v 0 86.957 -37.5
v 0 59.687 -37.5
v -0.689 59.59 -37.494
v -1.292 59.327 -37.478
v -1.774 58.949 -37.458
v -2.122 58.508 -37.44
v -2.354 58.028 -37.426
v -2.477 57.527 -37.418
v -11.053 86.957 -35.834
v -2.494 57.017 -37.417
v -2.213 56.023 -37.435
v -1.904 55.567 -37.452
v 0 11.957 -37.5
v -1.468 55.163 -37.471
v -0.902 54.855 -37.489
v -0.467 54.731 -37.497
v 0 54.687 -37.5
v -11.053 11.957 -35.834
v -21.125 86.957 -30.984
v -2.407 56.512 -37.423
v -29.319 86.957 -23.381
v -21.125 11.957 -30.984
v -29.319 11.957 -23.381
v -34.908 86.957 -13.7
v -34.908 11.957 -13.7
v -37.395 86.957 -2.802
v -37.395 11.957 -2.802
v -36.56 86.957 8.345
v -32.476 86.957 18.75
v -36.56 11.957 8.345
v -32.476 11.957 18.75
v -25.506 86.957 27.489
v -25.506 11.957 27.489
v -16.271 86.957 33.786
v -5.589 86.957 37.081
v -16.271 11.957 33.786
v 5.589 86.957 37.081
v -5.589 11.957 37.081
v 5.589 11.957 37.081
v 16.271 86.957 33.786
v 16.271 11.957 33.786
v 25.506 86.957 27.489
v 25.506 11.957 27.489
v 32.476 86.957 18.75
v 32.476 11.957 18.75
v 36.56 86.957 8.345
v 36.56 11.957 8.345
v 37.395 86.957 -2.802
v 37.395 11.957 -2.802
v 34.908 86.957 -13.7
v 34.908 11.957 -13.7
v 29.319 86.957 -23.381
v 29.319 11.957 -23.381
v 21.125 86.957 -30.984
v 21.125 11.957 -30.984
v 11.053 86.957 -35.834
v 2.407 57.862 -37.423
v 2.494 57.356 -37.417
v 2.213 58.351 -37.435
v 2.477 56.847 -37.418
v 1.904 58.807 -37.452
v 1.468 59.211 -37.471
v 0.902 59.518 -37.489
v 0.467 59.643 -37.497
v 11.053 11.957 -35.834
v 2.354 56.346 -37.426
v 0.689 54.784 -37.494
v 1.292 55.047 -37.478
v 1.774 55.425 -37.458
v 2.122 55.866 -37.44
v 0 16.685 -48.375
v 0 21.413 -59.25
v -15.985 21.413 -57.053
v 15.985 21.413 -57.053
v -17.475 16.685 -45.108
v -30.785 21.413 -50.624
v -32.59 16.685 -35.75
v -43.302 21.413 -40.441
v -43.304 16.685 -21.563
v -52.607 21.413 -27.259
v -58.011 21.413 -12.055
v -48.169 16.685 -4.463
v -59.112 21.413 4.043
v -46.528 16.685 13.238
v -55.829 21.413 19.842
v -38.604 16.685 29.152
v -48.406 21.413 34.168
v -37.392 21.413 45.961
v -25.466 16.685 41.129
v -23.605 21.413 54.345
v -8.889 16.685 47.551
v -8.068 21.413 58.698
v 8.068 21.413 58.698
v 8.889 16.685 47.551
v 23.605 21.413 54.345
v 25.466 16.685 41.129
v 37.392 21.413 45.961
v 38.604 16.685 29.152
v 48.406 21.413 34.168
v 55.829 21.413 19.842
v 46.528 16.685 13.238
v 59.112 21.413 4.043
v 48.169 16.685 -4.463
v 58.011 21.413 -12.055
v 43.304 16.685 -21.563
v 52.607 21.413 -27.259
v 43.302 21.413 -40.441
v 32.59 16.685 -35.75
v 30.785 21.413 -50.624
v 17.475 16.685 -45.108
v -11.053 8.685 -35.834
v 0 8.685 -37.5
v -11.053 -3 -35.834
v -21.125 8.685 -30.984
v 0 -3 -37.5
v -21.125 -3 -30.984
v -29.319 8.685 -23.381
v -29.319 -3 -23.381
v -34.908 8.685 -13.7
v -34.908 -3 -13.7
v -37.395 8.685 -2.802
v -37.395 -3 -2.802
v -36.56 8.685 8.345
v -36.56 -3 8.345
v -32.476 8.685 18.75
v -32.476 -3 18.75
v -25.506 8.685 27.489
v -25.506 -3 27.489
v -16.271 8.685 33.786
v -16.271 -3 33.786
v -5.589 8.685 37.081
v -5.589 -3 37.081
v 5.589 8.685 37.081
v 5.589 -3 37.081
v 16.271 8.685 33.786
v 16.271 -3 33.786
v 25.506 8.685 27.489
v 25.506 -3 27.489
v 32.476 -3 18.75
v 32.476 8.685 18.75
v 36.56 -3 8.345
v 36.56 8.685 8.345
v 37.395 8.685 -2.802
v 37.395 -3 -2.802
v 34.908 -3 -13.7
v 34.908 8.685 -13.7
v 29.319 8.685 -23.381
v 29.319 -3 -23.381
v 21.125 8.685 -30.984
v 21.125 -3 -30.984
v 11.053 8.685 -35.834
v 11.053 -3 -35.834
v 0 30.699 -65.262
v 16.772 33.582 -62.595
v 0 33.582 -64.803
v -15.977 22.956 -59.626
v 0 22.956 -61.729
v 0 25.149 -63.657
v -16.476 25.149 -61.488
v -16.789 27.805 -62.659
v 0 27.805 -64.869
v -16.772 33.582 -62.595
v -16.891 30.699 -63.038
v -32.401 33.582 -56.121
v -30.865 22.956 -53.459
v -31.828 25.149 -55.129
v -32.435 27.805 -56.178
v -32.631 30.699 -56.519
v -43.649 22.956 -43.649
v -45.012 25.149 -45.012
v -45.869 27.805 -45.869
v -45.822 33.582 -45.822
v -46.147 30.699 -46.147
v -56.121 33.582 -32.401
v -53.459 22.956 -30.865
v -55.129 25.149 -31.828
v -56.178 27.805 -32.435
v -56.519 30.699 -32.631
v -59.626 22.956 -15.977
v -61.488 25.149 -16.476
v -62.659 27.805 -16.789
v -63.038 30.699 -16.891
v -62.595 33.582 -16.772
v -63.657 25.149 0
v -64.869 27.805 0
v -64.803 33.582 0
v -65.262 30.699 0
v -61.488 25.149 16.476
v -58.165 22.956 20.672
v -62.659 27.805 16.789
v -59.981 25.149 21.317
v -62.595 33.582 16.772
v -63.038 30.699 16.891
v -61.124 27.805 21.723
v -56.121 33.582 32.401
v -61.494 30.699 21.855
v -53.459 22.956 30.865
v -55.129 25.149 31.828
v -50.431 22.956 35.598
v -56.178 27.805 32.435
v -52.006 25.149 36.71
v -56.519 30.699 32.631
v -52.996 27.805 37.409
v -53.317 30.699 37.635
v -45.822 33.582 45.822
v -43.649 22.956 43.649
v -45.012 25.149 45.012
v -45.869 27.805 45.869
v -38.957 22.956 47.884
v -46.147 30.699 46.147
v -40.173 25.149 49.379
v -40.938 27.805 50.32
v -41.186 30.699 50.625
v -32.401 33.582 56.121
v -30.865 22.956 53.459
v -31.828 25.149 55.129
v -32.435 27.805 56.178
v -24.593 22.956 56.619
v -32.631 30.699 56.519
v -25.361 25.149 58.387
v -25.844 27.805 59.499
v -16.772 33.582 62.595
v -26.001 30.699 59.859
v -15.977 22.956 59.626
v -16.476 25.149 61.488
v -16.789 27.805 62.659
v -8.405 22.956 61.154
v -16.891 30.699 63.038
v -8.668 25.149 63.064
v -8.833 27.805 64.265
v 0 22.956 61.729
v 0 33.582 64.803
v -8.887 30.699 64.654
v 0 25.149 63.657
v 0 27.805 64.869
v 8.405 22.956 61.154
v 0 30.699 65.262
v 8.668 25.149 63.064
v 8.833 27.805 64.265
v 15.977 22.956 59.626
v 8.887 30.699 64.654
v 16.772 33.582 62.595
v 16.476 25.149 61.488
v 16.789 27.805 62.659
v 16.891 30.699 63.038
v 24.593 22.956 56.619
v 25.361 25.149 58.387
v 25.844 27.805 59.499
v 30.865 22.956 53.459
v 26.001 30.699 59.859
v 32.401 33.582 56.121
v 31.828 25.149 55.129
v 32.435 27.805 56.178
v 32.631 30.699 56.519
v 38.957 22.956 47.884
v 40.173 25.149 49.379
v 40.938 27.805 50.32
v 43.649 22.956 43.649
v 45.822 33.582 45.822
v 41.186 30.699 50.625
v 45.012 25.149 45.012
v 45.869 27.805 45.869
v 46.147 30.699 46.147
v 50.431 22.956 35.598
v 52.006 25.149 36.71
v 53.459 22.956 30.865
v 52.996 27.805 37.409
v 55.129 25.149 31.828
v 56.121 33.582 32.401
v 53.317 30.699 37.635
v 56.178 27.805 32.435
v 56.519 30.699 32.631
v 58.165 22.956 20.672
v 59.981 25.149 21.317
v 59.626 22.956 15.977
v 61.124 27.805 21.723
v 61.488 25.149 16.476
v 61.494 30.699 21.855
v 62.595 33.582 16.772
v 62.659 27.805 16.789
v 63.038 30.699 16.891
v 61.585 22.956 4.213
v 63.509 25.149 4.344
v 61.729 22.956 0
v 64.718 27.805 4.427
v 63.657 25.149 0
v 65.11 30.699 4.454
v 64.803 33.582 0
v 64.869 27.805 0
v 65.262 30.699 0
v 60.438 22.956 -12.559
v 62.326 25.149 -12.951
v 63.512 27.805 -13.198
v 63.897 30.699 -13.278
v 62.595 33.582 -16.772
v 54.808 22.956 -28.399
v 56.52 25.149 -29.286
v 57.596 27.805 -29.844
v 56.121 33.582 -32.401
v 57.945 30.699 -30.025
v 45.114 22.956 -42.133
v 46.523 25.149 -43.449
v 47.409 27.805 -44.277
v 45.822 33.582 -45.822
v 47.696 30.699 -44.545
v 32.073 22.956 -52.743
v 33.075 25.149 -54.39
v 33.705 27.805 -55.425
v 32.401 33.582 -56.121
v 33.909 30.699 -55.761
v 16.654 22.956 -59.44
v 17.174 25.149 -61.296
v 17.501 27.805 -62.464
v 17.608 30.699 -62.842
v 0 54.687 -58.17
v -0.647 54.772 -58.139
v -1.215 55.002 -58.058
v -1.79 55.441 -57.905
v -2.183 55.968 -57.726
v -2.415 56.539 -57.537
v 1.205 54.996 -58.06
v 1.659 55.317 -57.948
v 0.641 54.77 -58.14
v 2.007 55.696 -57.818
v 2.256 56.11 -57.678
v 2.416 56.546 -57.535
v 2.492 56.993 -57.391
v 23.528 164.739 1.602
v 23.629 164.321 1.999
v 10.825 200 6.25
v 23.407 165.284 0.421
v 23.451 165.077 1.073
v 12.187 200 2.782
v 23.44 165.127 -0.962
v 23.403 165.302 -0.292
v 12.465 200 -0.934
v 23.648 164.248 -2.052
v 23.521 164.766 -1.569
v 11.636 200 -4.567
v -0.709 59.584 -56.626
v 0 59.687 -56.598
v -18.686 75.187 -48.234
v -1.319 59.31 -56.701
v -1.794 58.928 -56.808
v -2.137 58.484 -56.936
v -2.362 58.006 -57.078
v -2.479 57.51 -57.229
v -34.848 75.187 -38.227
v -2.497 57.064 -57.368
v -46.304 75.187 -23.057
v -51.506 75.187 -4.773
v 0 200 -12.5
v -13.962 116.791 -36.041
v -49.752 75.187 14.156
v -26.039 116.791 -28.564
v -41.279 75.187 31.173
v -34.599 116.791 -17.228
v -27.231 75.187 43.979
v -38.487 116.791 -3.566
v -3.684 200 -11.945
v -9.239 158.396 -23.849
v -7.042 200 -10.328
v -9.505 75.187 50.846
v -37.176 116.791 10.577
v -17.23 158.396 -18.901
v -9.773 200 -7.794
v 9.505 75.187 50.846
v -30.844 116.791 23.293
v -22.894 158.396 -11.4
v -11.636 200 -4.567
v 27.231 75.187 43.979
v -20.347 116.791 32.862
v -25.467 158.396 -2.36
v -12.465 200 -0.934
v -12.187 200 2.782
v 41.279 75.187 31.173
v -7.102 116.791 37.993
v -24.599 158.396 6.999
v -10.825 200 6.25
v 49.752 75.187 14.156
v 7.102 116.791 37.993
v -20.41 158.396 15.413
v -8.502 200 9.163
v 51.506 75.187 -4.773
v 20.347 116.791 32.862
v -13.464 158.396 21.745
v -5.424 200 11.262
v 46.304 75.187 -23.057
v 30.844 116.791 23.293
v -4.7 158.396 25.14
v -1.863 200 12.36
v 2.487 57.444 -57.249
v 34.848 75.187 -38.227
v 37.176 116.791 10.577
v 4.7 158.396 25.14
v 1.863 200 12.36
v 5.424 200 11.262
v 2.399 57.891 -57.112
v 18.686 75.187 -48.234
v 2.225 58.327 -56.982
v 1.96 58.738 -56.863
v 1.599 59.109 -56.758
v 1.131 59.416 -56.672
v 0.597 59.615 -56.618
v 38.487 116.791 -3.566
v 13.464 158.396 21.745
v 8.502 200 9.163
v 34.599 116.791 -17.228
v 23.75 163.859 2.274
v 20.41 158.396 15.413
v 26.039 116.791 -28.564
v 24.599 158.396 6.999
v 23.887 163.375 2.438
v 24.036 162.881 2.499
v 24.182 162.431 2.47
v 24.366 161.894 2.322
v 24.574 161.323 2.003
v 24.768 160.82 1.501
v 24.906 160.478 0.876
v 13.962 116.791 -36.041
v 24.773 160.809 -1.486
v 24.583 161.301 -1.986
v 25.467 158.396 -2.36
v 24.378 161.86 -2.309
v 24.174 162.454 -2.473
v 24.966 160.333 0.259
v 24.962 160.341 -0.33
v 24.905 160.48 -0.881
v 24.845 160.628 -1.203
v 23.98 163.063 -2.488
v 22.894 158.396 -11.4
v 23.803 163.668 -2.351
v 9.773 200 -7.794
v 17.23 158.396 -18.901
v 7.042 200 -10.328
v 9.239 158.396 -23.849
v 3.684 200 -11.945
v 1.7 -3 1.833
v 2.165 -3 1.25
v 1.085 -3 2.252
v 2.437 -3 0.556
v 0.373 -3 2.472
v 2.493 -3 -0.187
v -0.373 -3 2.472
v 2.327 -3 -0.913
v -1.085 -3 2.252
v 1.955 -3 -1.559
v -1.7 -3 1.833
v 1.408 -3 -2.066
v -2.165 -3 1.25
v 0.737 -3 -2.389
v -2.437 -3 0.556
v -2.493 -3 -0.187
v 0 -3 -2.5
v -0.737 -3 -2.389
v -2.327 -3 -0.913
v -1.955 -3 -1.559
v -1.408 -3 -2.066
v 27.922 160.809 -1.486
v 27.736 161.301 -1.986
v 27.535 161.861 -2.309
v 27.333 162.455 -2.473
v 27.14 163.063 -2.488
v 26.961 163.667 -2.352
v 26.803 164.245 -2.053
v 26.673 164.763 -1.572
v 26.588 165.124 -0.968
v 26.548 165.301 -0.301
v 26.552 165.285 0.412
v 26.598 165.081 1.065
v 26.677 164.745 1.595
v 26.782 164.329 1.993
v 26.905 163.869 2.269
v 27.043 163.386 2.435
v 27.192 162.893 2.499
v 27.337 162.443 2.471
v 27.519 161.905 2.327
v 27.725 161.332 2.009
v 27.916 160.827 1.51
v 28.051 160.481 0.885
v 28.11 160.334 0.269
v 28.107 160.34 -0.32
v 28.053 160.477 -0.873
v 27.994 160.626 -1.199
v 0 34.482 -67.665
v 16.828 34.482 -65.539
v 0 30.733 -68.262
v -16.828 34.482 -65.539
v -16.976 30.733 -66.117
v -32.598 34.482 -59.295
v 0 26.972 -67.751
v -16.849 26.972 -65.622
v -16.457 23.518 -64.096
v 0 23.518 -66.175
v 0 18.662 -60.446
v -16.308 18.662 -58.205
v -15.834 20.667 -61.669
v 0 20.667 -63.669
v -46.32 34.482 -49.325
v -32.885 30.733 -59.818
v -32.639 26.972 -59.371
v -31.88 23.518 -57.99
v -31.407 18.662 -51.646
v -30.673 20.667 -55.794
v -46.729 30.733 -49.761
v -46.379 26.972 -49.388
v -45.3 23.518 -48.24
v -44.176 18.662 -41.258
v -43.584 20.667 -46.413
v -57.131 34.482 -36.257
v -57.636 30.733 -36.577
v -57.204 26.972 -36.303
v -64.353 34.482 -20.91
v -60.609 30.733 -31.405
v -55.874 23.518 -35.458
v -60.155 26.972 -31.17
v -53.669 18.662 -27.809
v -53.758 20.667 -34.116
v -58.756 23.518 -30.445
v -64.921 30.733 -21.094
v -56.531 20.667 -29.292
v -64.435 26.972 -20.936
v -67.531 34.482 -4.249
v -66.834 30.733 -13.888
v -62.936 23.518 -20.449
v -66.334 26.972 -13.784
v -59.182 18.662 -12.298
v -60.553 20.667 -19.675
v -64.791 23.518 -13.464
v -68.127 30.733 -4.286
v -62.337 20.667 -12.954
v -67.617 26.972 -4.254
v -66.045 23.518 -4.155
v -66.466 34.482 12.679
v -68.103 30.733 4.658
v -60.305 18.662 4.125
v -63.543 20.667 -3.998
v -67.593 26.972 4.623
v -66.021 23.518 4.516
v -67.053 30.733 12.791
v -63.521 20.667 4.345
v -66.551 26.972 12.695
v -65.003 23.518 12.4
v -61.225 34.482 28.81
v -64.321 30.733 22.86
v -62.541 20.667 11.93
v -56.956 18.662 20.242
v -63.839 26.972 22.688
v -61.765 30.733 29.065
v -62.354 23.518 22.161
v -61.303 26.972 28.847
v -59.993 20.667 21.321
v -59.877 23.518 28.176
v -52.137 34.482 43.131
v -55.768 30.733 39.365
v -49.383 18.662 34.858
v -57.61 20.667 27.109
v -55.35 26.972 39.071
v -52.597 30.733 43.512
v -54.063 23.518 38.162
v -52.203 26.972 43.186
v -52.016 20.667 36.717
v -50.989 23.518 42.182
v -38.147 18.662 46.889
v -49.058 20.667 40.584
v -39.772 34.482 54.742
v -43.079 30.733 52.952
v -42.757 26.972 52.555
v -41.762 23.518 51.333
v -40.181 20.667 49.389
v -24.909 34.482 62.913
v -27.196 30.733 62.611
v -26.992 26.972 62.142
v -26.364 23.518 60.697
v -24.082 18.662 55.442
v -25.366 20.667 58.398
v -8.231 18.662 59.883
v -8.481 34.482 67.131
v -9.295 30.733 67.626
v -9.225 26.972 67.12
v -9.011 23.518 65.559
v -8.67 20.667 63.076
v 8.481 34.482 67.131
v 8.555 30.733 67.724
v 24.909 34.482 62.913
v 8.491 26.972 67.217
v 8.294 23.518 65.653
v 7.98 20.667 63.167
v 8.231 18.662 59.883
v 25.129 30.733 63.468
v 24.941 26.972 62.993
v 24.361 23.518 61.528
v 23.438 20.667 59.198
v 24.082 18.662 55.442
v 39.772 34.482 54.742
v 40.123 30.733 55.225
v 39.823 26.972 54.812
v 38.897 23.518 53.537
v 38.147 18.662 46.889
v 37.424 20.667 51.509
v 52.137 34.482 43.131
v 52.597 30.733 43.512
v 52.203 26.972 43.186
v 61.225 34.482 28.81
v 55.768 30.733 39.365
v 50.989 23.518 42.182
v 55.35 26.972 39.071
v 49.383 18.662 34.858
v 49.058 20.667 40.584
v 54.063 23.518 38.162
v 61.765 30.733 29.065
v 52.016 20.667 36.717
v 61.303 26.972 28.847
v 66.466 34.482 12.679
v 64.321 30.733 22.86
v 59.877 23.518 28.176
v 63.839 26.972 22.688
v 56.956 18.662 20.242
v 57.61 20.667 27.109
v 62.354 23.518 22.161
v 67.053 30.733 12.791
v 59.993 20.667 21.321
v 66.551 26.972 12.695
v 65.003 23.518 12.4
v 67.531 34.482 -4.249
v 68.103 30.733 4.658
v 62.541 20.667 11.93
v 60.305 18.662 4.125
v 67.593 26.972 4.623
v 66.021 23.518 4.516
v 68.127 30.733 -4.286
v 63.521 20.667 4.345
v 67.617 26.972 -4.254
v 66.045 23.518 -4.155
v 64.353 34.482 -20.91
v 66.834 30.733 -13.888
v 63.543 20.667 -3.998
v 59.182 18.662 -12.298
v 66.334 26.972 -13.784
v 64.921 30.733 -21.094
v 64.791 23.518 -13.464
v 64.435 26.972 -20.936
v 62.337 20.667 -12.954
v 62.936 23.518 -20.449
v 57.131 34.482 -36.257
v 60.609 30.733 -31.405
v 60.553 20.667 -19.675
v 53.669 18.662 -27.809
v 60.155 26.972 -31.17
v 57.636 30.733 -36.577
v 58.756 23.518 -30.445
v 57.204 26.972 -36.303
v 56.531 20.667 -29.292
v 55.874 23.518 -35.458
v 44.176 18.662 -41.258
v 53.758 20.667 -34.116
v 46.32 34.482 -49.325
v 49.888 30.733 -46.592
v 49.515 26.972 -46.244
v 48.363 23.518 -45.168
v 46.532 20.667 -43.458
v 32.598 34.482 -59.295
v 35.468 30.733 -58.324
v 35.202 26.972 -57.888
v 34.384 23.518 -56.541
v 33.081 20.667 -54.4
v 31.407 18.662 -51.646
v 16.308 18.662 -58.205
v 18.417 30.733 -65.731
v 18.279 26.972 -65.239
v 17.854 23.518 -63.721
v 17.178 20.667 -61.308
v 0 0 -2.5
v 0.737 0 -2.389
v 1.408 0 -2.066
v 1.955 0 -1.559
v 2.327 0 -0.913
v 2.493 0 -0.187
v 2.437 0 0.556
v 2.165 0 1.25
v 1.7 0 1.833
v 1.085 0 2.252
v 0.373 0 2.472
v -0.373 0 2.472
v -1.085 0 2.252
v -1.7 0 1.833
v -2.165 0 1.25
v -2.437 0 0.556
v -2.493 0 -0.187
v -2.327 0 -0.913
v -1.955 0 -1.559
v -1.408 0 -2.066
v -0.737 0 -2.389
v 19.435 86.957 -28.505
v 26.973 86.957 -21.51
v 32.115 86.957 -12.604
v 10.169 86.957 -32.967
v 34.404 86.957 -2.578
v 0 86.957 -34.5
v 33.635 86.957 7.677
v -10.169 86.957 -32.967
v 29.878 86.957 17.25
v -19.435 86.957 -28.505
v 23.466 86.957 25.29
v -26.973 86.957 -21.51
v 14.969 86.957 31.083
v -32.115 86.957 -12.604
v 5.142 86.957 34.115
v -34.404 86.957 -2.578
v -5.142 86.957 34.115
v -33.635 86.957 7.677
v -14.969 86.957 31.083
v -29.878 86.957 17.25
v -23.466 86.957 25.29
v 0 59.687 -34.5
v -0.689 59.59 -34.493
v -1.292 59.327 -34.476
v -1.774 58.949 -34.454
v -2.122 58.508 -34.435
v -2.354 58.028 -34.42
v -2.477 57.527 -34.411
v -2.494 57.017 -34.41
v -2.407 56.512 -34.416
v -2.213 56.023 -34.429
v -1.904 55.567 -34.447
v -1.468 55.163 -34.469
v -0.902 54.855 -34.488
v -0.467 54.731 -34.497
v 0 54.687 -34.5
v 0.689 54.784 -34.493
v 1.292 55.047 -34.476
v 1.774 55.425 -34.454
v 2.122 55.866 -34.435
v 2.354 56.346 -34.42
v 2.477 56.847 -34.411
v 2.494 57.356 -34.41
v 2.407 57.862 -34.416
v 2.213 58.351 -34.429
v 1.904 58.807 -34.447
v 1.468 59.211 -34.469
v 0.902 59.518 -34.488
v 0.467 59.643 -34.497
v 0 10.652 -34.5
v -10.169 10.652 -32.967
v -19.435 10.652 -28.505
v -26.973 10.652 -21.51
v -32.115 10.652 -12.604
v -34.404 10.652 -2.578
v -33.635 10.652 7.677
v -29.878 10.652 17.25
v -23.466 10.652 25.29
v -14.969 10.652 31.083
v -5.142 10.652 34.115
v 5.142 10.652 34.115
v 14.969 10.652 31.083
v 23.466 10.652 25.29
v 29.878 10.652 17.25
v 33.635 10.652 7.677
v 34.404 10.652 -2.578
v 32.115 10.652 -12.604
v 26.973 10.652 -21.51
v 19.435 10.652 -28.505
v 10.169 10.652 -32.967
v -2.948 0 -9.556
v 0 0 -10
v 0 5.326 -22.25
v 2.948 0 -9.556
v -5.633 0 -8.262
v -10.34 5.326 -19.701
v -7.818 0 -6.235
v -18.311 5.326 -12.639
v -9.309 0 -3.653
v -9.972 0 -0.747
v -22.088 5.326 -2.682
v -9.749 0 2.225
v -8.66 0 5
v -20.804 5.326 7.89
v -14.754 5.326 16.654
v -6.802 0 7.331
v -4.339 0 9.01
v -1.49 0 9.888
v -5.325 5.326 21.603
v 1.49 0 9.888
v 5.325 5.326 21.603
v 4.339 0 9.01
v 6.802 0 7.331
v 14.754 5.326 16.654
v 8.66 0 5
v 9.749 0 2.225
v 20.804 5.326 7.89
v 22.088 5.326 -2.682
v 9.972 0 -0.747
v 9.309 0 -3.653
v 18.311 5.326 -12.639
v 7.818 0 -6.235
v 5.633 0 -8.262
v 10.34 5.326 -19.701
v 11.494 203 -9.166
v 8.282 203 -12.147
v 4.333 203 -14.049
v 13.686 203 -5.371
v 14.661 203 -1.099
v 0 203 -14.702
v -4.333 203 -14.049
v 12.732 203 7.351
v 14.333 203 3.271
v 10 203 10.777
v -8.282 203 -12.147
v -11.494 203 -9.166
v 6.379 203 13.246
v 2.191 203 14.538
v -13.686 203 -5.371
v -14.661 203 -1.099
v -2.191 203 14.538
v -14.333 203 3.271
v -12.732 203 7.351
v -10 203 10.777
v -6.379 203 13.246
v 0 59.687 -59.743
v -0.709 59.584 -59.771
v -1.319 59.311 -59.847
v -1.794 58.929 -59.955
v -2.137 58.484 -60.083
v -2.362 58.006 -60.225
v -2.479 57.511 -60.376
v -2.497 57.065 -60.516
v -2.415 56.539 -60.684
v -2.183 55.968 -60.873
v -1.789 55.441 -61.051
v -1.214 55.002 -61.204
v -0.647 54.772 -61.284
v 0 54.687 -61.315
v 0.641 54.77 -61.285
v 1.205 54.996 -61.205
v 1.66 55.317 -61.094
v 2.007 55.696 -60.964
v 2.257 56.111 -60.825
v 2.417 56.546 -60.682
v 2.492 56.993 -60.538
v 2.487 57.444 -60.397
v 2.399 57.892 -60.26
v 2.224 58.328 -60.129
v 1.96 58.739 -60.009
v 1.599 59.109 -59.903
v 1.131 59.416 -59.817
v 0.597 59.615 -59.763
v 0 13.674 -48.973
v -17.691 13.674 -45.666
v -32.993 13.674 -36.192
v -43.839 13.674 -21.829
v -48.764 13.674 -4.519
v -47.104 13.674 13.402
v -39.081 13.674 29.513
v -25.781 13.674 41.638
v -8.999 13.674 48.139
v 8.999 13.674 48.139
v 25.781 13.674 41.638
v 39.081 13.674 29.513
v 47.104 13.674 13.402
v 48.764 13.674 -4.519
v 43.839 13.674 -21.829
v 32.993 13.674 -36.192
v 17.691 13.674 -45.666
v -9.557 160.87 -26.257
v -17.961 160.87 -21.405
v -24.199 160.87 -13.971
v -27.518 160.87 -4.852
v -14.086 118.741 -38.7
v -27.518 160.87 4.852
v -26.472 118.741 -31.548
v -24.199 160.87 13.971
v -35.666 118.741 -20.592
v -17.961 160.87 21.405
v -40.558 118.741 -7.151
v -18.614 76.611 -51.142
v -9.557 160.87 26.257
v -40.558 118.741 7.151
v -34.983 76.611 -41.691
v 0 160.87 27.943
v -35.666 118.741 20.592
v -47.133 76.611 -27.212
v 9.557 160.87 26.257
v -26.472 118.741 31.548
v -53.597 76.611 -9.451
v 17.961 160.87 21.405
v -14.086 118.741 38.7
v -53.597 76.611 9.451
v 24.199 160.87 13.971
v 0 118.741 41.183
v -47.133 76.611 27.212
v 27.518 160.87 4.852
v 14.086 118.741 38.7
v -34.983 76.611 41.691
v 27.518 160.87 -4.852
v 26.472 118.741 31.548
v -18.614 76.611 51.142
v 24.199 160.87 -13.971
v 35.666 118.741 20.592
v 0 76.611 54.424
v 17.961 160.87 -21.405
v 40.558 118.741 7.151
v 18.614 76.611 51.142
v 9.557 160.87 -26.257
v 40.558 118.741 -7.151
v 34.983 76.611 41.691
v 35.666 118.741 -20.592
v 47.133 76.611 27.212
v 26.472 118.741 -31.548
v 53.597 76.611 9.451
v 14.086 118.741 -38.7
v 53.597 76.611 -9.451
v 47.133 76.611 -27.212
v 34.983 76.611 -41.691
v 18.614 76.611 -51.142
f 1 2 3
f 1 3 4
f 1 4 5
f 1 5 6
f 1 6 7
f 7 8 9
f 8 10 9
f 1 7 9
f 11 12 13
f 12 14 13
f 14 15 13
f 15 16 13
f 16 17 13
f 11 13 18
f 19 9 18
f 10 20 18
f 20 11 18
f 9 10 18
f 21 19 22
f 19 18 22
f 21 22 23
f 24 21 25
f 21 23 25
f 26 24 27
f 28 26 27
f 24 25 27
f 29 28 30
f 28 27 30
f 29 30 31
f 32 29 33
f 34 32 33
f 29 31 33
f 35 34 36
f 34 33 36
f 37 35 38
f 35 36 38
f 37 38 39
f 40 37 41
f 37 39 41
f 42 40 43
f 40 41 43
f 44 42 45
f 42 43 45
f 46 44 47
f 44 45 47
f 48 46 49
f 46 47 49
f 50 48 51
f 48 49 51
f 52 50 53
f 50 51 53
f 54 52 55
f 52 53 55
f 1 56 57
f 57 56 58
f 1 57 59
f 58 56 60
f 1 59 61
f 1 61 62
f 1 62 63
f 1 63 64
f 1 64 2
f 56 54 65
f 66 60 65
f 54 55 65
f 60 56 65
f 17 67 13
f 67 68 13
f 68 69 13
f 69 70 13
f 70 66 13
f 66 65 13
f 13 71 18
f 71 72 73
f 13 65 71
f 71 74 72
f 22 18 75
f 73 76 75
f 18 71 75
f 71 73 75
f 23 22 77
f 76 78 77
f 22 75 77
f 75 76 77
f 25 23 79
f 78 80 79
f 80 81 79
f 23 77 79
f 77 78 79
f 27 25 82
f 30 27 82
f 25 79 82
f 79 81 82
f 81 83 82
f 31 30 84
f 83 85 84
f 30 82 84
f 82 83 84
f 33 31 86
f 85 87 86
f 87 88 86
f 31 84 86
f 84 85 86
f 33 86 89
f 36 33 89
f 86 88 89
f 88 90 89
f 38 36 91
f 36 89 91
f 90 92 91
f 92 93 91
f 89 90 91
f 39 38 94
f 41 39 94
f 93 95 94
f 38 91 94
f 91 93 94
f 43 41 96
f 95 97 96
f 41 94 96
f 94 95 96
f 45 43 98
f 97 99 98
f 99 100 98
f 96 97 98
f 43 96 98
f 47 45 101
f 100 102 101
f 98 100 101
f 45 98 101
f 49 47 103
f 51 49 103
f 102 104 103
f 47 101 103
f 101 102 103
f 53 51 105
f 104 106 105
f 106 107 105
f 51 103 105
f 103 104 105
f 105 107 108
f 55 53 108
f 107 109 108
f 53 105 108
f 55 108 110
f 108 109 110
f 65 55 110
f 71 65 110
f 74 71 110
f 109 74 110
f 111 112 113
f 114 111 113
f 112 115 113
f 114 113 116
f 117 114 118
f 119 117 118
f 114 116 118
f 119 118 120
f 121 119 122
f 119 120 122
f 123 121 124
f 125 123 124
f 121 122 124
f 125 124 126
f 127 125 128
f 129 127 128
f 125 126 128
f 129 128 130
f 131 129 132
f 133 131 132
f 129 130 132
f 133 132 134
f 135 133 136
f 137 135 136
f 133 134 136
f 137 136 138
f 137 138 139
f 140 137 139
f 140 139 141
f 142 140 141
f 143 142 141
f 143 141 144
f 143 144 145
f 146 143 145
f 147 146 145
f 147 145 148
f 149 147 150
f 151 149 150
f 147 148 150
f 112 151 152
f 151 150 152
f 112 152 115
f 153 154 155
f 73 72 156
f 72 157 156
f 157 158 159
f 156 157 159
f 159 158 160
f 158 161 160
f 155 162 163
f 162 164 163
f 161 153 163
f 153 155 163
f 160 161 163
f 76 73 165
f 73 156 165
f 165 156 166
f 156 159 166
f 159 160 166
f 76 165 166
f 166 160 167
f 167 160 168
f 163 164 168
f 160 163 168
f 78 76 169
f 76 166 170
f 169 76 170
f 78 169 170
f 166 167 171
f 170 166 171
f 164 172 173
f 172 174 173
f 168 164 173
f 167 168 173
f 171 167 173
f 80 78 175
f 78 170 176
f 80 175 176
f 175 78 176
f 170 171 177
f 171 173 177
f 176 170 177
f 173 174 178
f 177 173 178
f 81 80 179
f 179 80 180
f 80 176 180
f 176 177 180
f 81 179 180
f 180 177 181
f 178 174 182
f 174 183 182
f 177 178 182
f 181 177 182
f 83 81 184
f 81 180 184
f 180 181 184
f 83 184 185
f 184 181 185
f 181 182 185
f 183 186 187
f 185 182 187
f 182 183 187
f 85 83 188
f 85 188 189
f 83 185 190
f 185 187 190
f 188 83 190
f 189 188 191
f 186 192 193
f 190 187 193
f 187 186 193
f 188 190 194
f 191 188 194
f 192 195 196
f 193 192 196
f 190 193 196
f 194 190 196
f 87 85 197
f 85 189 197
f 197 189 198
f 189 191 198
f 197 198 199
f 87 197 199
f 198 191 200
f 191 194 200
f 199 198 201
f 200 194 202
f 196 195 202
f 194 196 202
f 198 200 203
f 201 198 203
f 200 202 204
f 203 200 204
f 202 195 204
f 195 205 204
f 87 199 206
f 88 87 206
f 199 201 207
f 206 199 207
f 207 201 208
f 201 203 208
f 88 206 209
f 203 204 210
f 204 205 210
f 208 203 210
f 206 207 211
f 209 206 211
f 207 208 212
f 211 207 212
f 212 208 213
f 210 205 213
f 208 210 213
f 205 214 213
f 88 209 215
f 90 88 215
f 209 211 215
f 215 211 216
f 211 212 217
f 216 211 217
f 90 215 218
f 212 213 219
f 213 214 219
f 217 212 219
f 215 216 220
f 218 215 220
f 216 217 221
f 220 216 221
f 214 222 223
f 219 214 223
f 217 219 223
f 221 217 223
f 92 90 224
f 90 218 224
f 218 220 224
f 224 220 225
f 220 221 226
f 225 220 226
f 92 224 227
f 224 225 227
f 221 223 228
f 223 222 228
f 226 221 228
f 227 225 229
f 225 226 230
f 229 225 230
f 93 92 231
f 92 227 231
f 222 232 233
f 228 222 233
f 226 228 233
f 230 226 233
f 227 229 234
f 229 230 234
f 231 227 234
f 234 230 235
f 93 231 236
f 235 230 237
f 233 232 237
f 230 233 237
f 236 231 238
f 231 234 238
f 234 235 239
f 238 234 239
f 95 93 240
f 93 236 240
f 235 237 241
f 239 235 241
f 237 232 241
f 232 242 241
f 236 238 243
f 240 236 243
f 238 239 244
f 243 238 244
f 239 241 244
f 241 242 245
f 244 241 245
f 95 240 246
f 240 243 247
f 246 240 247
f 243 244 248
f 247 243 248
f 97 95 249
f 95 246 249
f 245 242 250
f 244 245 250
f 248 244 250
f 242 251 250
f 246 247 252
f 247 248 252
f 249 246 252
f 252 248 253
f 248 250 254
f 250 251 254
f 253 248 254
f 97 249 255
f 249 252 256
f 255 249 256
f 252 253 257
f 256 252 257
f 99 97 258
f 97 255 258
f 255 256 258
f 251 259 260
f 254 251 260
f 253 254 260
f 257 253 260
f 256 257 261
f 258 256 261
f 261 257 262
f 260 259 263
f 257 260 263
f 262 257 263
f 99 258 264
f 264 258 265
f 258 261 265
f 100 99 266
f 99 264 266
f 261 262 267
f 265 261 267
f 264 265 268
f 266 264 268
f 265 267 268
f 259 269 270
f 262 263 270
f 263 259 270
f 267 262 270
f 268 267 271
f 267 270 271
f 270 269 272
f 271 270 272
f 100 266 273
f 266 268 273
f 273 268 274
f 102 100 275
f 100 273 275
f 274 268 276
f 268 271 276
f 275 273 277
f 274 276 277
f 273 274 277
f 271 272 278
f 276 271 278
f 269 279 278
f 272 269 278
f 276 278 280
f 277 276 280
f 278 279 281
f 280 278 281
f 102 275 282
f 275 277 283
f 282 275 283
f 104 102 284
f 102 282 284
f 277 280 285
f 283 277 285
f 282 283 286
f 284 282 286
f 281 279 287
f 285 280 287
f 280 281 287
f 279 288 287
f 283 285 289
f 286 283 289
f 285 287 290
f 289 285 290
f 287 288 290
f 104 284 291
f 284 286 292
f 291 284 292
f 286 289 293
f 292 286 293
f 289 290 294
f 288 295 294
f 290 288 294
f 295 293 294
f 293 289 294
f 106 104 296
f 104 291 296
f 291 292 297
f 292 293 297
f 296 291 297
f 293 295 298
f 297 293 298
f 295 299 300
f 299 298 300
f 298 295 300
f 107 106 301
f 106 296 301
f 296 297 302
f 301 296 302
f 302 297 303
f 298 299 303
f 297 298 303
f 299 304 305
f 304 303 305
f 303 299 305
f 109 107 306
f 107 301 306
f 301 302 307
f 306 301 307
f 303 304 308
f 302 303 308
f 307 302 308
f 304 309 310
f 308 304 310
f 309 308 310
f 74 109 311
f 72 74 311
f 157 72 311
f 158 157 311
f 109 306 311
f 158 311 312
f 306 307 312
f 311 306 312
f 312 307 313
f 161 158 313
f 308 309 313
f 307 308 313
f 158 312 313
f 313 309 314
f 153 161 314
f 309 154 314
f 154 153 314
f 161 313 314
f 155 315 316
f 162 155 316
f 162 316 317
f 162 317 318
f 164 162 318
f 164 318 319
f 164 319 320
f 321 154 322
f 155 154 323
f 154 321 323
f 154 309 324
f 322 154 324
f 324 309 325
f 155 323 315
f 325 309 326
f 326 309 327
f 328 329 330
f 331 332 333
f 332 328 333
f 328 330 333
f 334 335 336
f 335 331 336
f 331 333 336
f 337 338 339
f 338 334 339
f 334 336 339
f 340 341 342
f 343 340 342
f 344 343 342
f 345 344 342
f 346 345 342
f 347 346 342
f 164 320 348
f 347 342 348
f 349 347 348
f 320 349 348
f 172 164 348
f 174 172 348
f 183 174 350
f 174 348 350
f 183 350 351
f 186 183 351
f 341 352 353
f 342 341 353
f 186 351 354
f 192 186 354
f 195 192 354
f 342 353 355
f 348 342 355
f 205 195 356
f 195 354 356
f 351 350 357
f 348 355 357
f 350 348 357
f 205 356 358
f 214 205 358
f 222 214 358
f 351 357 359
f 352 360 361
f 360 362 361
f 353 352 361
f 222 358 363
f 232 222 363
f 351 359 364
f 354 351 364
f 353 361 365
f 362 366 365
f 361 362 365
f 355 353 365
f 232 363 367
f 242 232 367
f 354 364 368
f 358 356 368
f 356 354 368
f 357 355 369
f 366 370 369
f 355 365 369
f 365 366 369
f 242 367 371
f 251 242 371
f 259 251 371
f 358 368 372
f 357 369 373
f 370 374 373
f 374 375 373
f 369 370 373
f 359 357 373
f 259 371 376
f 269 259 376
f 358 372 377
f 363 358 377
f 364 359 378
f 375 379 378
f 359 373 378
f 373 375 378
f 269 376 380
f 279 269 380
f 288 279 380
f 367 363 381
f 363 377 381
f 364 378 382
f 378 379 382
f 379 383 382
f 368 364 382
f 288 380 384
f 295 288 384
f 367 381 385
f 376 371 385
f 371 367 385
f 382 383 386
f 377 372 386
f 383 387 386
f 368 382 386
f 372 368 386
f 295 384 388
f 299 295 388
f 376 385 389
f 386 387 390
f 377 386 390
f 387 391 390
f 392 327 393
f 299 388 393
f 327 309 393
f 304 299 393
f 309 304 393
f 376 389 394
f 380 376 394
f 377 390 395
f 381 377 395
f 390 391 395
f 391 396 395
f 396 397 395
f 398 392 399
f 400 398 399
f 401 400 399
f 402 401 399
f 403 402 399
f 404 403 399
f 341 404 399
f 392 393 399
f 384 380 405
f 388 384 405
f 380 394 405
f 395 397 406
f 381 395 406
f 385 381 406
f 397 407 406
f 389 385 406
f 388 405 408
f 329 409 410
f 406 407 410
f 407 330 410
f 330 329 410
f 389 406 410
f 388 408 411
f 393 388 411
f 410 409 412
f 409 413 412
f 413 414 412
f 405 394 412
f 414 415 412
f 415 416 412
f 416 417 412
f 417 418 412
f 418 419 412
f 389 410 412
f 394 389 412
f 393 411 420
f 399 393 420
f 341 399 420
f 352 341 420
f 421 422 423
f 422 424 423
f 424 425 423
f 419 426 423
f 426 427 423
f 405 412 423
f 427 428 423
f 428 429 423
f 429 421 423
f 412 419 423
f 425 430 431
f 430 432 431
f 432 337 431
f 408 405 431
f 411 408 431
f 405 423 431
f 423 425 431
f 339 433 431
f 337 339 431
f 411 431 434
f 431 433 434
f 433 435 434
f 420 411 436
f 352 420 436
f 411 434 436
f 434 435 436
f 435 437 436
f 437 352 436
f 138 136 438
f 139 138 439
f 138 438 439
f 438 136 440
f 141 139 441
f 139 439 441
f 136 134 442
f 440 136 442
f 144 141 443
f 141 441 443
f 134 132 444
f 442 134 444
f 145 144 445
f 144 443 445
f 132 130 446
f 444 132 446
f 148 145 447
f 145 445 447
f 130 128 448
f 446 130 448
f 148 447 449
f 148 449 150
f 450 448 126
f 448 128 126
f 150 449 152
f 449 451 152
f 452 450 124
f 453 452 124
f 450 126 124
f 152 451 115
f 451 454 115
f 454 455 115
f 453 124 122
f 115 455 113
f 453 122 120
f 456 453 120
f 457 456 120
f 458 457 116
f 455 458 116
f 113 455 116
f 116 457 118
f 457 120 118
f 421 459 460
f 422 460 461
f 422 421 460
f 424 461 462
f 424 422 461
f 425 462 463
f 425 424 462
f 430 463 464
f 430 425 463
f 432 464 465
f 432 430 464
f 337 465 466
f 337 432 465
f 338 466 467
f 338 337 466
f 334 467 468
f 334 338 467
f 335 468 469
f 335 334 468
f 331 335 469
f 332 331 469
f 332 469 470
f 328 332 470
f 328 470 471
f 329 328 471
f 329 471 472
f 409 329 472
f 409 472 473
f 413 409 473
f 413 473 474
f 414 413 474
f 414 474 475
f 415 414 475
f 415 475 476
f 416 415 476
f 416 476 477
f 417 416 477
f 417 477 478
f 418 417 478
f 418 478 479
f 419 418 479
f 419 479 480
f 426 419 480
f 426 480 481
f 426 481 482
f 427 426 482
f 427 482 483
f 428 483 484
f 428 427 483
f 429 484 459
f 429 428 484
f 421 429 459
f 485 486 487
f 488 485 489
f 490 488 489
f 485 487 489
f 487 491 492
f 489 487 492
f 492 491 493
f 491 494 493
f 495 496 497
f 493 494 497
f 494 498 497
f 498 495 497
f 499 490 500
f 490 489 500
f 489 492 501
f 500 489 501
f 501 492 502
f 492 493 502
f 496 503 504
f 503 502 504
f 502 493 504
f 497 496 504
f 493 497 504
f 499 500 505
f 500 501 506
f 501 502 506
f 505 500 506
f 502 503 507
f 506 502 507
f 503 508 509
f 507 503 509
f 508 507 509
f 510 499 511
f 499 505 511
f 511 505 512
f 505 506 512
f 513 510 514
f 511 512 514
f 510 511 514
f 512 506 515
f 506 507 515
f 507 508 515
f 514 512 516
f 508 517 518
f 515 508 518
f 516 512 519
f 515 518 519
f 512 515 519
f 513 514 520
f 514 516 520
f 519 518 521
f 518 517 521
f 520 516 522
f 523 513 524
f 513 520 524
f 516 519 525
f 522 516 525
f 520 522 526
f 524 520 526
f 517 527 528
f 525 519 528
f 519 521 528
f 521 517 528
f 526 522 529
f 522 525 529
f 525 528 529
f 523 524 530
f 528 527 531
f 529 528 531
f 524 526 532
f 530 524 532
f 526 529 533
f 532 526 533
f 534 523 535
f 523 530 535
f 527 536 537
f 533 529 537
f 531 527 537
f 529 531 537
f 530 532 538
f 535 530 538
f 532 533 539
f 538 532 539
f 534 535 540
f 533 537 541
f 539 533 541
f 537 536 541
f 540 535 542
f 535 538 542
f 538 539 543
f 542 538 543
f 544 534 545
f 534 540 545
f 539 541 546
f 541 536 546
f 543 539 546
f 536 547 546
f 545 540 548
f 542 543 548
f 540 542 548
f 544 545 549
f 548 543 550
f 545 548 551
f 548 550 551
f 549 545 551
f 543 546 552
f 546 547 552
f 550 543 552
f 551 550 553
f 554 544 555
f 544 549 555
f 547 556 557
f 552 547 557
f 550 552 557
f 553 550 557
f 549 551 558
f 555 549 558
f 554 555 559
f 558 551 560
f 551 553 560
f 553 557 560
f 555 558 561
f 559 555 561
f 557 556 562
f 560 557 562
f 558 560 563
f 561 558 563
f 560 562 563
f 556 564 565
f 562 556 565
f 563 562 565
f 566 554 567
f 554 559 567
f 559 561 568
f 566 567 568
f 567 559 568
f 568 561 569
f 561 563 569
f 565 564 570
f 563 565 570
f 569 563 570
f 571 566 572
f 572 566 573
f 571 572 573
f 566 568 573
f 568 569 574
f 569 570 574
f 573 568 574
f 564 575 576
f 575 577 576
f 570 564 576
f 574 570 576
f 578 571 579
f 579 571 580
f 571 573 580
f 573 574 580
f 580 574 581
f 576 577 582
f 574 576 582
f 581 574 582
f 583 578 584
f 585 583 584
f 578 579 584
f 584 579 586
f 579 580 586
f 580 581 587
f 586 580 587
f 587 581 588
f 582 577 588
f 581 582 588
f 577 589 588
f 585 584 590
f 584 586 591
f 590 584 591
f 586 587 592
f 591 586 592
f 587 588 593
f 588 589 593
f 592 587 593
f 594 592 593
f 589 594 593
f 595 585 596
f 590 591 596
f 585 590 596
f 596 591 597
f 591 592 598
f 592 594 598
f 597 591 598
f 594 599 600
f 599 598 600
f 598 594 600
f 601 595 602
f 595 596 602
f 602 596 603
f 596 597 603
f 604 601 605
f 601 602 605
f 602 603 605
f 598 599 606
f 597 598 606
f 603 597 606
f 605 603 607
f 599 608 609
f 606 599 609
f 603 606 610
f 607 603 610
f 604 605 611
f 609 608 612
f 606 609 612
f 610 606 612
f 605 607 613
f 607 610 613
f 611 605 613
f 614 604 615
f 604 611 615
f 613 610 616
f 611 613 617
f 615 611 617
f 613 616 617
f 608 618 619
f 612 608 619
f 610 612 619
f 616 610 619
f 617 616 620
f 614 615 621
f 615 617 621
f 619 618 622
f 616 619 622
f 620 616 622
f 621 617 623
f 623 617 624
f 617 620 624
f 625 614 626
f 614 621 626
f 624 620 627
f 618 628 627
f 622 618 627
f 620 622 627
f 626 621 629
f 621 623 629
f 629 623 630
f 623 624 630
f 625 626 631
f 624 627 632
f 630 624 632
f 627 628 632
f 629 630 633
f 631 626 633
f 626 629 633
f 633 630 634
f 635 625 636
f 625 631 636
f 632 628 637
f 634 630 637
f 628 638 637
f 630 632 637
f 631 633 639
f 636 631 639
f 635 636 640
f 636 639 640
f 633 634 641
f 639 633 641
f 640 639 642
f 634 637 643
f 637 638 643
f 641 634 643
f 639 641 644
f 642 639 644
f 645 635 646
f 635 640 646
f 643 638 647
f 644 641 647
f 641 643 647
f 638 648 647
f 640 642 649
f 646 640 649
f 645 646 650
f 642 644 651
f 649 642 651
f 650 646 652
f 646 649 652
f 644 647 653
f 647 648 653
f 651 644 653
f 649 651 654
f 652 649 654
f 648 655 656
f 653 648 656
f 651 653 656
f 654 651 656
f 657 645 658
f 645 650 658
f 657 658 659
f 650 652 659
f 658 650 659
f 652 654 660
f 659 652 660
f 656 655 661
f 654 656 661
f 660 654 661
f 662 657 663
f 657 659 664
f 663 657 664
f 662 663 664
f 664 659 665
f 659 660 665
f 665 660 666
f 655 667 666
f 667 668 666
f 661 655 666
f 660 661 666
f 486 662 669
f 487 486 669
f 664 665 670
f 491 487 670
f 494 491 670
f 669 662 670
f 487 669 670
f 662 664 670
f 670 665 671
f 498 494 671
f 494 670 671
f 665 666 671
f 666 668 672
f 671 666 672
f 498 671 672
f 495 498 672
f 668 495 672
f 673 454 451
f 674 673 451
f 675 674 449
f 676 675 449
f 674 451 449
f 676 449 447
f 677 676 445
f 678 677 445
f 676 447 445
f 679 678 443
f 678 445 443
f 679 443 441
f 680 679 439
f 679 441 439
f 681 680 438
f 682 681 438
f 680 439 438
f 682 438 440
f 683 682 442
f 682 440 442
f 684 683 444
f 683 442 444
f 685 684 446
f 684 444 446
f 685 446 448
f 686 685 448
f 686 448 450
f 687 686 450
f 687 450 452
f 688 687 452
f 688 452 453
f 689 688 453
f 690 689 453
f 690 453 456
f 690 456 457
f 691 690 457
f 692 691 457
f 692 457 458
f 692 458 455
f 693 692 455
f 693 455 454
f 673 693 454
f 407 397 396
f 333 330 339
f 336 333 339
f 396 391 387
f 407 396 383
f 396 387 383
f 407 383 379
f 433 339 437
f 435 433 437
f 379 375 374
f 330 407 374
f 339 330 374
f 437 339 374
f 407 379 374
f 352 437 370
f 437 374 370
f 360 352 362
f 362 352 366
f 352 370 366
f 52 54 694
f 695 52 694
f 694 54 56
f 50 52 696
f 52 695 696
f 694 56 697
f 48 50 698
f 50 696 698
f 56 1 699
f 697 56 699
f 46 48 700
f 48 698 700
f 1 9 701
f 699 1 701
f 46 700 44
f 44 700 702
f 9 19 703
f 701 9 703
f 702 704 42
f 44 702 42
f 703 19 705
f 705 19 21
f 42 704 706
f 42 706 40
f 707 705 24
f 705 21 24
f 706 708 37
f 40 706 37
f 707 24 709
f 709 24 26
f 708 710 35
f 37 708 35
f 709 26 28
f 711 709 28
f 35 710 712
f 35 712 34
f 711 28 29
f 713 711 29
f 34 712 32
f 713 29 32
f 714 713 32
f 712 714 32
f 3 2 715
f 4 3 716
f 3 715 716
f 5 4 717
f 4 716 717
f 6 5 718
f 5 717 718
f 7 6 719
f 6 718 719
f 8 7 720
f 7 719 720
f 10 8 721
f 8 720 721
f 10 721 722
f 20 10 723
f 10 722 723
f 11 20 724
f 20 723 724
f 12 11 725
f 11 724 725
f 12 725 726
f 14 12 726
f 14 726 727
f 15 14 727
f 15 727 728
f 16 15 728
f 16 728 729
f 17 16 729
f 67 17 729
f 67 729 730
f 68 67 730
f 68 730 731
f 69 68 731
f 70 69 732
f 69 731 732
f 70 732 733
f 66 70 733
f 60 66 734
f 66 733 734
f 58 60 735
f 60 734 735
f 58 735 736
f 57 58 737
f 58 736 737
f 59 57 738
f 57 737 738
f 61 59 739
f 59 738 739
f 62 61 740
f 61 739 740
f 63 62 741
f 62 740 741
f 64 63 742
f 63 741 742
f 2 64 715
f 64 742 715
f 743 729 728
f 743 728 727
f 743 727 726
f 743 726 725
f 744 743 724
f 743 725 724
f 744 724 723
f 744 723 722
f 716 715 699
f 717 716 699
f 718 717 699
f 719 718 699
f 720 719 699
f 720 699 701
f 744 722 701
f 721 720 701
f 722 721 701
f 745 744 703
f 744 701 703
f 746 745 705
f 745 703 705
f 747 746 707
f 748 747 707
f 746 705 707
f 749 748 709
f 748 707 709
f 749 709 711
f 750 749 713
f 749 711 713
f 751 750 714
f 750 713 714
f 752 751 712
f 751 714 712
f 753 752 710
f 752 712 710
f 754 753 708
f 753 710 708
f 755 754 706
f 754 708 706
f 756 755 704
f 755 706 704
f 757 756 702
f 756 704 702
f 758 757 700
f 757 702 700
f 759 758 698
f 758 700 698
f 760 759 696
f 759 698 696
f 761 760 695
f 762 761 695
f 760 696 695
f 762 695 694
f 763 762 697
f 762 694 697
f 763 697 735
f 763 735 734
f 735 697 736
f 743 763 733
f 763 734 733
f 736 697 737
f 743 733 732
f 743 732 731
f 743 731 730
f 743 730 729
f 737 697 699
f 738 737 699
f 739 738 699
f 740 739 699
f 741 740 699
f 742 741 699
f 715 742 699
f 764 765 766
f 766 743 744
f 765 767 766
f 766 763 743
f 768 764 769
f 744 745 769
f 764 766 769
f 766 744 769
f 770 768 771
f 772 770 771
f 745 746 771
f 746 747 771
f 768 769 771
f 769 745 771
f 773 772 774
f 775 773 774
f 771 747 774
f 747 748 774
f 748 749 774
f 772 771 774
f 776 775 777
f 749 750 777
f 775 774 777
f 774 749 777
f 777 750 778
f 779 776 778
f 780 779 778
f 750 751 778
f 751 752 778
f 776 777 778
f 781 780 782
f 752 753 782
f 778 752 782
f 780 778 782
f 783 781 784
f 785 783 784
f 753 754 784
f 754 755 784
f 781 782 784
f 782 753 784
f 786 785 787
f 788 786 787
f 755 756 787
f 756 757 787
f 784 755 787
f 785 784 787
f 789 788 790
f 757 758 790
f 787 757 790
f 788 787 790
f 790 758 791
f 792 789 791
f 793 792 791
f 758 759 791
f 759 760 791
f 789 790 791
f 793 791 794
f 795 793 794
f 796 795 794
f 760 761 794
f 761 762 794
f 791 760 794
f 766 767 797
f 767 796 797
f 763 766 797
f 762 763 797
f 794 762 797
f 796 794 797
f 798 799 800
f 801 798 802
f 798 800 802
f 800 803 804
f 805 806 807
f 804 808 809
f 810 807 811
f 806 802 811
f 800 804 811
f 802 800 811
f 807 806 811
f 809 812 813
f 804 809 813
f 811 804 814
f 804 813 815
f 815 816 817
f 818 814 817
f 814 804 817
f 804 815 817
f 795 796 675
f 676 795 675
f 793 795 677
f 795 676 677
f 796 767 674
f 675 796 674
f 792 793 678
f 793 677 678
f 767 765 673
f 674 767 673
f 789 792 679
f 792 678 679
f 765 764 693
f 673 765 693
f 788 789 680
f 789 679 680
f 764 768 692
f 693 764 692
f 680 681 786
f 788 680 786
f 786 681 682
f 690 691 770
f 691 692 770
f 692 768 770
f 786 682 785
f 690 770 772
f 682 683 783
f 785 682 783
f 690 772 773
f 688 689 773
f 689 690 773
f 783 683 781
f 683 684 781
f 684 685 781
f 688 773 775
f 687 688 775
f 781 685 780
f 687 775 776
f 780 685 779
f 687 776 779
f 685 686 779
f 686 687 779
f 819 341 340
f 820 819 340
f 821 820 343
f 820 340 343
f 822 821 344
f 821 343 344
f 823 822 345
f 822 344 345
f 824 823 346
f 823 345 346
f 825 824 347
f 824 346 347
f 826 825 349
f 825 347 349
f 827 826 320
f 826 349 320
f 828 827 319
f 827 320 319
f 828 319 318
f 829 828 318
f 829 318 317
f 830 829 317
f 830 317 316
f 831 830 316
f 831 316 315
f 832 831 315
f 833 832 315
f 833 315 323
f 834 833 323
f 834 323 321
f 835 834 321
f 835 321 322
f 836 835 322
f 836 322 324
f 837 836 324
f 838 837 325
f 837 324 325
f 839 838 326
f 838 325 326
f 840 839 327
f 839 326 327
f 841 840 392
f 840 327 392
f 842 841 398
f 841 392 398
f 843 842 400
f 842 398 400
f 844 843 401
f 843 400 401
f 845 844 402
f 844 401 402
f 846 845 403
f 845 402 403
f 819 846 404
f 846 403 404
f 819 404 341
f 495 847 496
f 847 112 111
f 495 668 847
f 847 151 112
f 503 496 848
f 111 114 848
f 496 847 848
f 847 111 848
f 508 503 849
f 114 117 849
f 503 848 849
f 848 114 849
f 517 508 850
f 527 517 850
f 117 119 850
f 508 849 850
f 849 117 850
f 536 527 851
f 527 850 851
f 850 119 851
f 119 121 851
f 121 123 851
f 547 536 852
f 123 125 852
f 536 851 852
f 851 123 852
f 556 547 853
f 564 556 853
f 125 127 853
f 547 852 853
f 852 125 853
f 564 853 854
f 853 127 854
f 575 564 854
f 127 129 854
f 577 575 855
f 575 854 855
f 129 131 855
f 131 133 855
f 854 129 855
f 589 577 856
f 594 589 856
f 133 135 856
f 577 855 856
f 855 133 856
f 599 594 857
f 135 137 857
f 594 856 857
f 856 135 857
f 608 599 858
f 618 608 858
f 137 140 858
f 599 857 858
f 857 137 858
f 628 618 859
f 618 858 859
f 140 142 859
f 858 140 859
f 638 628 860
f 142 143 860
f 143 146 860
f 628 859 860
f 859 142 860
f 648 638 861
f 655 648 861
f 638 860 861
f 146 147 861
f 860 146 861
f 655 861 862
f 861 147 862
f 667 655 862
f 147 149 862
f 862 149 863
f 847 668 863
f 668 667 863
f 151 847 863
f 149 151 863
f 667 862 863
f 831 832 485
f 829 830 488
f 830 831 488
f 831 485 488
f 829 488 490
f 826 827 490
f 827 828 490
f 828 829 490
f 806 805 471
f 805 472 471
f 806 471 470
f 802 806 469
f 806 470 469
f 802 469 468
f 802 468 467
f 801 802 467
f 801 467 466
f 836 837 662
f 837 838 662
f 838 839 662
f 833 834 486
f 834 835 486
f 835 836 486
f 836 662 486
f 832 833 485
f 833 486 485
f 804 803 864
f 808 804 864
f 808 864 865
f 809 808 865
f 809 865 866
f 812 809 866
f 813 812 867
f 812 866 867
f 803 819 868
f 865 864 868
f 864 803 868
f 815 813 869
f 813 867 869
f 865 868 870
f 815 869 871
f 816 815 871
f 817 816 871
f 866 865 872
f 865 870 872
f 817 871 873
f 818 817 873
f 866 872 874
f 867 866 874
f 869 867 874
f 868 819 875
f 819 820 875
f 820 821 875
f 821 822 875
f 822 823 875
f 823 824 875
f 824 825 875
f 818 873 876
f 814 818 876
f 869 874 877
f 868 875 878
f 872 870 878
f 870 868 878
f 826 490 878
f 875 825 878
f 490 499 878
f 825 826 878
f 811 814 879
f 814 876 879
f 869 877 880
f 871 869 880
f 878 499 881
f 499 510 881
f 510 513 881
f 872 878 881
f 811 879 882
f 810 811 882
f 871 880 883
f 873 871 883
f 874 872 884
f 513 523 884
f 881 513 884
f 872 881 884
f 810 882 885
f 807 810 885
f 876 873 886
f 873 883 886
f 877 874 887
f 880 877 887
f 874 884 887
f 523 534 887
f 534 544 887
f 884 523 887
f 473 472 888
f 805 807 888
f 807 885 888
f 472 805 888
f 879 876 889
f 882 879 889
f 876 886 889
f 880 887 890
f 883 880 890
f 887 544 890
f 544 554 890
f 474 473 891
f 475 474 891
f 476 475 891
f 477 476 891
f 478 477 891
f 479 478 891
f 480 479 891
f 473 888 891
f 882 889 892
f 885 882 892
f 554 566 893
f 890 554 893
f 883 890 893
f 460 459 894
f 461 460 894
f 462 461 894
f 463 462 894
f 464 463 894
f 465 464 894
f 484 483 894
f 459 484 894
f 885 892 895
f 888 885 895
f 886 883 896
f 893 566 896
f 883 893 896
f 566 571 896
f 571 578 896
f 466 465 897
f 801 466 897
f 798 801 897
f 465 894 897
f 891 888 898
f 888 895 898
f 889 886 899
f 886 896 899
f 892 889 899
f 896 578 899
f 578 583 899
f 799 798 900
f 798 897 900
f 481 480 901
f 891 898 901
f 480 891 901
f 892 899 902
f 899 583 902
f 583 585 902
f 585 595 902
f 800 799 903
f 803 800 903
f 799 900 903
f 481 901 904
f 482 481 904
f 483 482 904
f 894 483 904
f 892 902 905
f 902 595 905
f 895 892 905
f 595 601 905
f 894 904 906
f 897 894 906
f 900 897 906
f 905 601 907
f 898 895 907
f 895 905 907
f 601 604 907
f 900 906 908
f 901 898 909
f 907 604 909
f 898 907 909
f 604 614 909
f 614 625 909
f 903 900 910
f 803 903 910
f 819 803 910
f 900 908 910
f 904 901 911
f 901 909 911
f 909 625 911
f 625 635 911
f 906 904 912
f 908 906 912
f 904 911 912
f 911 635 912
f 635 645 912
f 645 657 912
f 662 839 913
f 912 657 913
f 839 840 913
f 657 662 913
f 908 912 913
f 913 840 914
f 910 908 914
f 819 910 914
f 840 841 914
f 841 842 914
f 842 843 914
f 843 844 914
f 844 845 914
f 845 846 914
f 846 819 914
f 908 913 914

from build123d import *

# Parameters (mm, degrees)
CORTE_EXTRUS_O1_REACH = 208
ESBO_O2_R             = 2.5
ESBO_O4_R             = 2.5
CORTE_EXTRUS_O2_DEPTH = 50
ESBO_O5_R             = 2.5
CORTE_EXTRUS_O3_DEPTH = 110


with BuildPart() as part:
    # Esboço1 → Revolução1 (revolve)
    with BuildSketch(Plane.XY, mode=Mode.PRIVATE) as revolu_o1_sk:
        with BuildLine():
            Line((0, 0), (10, 0))
            Line((10, 0), (34.5, 10.652173913))
            Line((34.5, 10.652173913), (34.5, 86.956521739))
            Line((34.5, 86.956521739), (37.5, 86.956521739))
            Line((37.5, 86.956521739), (37.5, 11.956521739))
            Line((37.5, 11.956521739), (59.250106277, 21.413089686))
            ThreePointArc((59.250106277, 21.413089686), (64.360493758, 26.432550668), (64.802782332, 33.582056216))
            Line((64.802782332, 33.582056216), (12.5, 200))
            Line((12.5, 200), (0, 200))
            Line((0, 200), (0, 203))
            Line((0, 203), (14.701817656, 203))
            Line((14.701817656, 203), (67.664763483, 34.481536006))
            ThreePointArc((67.664763483, 34.481536006), (67.089788336, 25.187178794), (60.446284612, 18.661879517))
            Line((60.446284612, 18.661879517), (37.5, 8.685234034))
            Line((37.5, 8.685234034), (37.5, -3))
            Line((37.5, -3), (10.623961722, -3))
            Line((10.623961722, -3), (0, -3))
            Line((0, -3), (0, 0))
        make_face()
    revolve(revolu_o1_sk.sketch.rotate(Axis((0, 0, 0), (0, 1, 0)), 90), axis=Axis((0, 0, 0), (0, 1, 0)))  # turned: the seam where the file's is

    # Esboço2 → Corte-extrusão1 (cut, up to next)
    with BuildSketch(Plane.XZ.offset(3), mode=Mode.PRIVATE) as corte_extrus_o1_sk1:
        with Locations(Location((0, 0, 0), (0, 0, 270))):  # turned: the seam where the file's is
            Circle(ESBO_O2_R)
    corte_extrus_o1_tool1 = extrude(corte_extrus_o1_sk1.sketch, amount=-CORTE_EXTRUS_O1_REACH, mode=Mode.PRIVATE) & part.part
    add(corte_extrus_o1_tool1.solids().sort_by_distance((0, -3, 0))[0], mode=Mode.SUBTRACT)

    # Esboço4 → Corte-extrusão2 (cut)
    with BuildSketch(Plane(origin=(0, 0, 0), x_dir=(0, 0, -1), z_dir=(1, 0, 0))):
        with Locations(Location((0, 162.819249831, 0), (0, 0, 306.470564915))):  # turned: the seam where the file's is
            Circle(ESBO_O4_R)
    extrude(amount=CORTE_EXTRUS_O2_DEPTH, mode=Mode.SUBTRACT)

    # Esboço5 → Corte-extrusão3 (cut)
    with BuildSketch(Plane.XY):
        with Locations(Location((0, 57.186880689, 0), (0, 0, 90))):  # turned: the seam where the file's is
            Circle(ESBO_O5_R)
    extrude(amount=-CORTE_EXTRUS_O3_DEPTH, mode=Mode.SUBTRACT)


solid = part.part
